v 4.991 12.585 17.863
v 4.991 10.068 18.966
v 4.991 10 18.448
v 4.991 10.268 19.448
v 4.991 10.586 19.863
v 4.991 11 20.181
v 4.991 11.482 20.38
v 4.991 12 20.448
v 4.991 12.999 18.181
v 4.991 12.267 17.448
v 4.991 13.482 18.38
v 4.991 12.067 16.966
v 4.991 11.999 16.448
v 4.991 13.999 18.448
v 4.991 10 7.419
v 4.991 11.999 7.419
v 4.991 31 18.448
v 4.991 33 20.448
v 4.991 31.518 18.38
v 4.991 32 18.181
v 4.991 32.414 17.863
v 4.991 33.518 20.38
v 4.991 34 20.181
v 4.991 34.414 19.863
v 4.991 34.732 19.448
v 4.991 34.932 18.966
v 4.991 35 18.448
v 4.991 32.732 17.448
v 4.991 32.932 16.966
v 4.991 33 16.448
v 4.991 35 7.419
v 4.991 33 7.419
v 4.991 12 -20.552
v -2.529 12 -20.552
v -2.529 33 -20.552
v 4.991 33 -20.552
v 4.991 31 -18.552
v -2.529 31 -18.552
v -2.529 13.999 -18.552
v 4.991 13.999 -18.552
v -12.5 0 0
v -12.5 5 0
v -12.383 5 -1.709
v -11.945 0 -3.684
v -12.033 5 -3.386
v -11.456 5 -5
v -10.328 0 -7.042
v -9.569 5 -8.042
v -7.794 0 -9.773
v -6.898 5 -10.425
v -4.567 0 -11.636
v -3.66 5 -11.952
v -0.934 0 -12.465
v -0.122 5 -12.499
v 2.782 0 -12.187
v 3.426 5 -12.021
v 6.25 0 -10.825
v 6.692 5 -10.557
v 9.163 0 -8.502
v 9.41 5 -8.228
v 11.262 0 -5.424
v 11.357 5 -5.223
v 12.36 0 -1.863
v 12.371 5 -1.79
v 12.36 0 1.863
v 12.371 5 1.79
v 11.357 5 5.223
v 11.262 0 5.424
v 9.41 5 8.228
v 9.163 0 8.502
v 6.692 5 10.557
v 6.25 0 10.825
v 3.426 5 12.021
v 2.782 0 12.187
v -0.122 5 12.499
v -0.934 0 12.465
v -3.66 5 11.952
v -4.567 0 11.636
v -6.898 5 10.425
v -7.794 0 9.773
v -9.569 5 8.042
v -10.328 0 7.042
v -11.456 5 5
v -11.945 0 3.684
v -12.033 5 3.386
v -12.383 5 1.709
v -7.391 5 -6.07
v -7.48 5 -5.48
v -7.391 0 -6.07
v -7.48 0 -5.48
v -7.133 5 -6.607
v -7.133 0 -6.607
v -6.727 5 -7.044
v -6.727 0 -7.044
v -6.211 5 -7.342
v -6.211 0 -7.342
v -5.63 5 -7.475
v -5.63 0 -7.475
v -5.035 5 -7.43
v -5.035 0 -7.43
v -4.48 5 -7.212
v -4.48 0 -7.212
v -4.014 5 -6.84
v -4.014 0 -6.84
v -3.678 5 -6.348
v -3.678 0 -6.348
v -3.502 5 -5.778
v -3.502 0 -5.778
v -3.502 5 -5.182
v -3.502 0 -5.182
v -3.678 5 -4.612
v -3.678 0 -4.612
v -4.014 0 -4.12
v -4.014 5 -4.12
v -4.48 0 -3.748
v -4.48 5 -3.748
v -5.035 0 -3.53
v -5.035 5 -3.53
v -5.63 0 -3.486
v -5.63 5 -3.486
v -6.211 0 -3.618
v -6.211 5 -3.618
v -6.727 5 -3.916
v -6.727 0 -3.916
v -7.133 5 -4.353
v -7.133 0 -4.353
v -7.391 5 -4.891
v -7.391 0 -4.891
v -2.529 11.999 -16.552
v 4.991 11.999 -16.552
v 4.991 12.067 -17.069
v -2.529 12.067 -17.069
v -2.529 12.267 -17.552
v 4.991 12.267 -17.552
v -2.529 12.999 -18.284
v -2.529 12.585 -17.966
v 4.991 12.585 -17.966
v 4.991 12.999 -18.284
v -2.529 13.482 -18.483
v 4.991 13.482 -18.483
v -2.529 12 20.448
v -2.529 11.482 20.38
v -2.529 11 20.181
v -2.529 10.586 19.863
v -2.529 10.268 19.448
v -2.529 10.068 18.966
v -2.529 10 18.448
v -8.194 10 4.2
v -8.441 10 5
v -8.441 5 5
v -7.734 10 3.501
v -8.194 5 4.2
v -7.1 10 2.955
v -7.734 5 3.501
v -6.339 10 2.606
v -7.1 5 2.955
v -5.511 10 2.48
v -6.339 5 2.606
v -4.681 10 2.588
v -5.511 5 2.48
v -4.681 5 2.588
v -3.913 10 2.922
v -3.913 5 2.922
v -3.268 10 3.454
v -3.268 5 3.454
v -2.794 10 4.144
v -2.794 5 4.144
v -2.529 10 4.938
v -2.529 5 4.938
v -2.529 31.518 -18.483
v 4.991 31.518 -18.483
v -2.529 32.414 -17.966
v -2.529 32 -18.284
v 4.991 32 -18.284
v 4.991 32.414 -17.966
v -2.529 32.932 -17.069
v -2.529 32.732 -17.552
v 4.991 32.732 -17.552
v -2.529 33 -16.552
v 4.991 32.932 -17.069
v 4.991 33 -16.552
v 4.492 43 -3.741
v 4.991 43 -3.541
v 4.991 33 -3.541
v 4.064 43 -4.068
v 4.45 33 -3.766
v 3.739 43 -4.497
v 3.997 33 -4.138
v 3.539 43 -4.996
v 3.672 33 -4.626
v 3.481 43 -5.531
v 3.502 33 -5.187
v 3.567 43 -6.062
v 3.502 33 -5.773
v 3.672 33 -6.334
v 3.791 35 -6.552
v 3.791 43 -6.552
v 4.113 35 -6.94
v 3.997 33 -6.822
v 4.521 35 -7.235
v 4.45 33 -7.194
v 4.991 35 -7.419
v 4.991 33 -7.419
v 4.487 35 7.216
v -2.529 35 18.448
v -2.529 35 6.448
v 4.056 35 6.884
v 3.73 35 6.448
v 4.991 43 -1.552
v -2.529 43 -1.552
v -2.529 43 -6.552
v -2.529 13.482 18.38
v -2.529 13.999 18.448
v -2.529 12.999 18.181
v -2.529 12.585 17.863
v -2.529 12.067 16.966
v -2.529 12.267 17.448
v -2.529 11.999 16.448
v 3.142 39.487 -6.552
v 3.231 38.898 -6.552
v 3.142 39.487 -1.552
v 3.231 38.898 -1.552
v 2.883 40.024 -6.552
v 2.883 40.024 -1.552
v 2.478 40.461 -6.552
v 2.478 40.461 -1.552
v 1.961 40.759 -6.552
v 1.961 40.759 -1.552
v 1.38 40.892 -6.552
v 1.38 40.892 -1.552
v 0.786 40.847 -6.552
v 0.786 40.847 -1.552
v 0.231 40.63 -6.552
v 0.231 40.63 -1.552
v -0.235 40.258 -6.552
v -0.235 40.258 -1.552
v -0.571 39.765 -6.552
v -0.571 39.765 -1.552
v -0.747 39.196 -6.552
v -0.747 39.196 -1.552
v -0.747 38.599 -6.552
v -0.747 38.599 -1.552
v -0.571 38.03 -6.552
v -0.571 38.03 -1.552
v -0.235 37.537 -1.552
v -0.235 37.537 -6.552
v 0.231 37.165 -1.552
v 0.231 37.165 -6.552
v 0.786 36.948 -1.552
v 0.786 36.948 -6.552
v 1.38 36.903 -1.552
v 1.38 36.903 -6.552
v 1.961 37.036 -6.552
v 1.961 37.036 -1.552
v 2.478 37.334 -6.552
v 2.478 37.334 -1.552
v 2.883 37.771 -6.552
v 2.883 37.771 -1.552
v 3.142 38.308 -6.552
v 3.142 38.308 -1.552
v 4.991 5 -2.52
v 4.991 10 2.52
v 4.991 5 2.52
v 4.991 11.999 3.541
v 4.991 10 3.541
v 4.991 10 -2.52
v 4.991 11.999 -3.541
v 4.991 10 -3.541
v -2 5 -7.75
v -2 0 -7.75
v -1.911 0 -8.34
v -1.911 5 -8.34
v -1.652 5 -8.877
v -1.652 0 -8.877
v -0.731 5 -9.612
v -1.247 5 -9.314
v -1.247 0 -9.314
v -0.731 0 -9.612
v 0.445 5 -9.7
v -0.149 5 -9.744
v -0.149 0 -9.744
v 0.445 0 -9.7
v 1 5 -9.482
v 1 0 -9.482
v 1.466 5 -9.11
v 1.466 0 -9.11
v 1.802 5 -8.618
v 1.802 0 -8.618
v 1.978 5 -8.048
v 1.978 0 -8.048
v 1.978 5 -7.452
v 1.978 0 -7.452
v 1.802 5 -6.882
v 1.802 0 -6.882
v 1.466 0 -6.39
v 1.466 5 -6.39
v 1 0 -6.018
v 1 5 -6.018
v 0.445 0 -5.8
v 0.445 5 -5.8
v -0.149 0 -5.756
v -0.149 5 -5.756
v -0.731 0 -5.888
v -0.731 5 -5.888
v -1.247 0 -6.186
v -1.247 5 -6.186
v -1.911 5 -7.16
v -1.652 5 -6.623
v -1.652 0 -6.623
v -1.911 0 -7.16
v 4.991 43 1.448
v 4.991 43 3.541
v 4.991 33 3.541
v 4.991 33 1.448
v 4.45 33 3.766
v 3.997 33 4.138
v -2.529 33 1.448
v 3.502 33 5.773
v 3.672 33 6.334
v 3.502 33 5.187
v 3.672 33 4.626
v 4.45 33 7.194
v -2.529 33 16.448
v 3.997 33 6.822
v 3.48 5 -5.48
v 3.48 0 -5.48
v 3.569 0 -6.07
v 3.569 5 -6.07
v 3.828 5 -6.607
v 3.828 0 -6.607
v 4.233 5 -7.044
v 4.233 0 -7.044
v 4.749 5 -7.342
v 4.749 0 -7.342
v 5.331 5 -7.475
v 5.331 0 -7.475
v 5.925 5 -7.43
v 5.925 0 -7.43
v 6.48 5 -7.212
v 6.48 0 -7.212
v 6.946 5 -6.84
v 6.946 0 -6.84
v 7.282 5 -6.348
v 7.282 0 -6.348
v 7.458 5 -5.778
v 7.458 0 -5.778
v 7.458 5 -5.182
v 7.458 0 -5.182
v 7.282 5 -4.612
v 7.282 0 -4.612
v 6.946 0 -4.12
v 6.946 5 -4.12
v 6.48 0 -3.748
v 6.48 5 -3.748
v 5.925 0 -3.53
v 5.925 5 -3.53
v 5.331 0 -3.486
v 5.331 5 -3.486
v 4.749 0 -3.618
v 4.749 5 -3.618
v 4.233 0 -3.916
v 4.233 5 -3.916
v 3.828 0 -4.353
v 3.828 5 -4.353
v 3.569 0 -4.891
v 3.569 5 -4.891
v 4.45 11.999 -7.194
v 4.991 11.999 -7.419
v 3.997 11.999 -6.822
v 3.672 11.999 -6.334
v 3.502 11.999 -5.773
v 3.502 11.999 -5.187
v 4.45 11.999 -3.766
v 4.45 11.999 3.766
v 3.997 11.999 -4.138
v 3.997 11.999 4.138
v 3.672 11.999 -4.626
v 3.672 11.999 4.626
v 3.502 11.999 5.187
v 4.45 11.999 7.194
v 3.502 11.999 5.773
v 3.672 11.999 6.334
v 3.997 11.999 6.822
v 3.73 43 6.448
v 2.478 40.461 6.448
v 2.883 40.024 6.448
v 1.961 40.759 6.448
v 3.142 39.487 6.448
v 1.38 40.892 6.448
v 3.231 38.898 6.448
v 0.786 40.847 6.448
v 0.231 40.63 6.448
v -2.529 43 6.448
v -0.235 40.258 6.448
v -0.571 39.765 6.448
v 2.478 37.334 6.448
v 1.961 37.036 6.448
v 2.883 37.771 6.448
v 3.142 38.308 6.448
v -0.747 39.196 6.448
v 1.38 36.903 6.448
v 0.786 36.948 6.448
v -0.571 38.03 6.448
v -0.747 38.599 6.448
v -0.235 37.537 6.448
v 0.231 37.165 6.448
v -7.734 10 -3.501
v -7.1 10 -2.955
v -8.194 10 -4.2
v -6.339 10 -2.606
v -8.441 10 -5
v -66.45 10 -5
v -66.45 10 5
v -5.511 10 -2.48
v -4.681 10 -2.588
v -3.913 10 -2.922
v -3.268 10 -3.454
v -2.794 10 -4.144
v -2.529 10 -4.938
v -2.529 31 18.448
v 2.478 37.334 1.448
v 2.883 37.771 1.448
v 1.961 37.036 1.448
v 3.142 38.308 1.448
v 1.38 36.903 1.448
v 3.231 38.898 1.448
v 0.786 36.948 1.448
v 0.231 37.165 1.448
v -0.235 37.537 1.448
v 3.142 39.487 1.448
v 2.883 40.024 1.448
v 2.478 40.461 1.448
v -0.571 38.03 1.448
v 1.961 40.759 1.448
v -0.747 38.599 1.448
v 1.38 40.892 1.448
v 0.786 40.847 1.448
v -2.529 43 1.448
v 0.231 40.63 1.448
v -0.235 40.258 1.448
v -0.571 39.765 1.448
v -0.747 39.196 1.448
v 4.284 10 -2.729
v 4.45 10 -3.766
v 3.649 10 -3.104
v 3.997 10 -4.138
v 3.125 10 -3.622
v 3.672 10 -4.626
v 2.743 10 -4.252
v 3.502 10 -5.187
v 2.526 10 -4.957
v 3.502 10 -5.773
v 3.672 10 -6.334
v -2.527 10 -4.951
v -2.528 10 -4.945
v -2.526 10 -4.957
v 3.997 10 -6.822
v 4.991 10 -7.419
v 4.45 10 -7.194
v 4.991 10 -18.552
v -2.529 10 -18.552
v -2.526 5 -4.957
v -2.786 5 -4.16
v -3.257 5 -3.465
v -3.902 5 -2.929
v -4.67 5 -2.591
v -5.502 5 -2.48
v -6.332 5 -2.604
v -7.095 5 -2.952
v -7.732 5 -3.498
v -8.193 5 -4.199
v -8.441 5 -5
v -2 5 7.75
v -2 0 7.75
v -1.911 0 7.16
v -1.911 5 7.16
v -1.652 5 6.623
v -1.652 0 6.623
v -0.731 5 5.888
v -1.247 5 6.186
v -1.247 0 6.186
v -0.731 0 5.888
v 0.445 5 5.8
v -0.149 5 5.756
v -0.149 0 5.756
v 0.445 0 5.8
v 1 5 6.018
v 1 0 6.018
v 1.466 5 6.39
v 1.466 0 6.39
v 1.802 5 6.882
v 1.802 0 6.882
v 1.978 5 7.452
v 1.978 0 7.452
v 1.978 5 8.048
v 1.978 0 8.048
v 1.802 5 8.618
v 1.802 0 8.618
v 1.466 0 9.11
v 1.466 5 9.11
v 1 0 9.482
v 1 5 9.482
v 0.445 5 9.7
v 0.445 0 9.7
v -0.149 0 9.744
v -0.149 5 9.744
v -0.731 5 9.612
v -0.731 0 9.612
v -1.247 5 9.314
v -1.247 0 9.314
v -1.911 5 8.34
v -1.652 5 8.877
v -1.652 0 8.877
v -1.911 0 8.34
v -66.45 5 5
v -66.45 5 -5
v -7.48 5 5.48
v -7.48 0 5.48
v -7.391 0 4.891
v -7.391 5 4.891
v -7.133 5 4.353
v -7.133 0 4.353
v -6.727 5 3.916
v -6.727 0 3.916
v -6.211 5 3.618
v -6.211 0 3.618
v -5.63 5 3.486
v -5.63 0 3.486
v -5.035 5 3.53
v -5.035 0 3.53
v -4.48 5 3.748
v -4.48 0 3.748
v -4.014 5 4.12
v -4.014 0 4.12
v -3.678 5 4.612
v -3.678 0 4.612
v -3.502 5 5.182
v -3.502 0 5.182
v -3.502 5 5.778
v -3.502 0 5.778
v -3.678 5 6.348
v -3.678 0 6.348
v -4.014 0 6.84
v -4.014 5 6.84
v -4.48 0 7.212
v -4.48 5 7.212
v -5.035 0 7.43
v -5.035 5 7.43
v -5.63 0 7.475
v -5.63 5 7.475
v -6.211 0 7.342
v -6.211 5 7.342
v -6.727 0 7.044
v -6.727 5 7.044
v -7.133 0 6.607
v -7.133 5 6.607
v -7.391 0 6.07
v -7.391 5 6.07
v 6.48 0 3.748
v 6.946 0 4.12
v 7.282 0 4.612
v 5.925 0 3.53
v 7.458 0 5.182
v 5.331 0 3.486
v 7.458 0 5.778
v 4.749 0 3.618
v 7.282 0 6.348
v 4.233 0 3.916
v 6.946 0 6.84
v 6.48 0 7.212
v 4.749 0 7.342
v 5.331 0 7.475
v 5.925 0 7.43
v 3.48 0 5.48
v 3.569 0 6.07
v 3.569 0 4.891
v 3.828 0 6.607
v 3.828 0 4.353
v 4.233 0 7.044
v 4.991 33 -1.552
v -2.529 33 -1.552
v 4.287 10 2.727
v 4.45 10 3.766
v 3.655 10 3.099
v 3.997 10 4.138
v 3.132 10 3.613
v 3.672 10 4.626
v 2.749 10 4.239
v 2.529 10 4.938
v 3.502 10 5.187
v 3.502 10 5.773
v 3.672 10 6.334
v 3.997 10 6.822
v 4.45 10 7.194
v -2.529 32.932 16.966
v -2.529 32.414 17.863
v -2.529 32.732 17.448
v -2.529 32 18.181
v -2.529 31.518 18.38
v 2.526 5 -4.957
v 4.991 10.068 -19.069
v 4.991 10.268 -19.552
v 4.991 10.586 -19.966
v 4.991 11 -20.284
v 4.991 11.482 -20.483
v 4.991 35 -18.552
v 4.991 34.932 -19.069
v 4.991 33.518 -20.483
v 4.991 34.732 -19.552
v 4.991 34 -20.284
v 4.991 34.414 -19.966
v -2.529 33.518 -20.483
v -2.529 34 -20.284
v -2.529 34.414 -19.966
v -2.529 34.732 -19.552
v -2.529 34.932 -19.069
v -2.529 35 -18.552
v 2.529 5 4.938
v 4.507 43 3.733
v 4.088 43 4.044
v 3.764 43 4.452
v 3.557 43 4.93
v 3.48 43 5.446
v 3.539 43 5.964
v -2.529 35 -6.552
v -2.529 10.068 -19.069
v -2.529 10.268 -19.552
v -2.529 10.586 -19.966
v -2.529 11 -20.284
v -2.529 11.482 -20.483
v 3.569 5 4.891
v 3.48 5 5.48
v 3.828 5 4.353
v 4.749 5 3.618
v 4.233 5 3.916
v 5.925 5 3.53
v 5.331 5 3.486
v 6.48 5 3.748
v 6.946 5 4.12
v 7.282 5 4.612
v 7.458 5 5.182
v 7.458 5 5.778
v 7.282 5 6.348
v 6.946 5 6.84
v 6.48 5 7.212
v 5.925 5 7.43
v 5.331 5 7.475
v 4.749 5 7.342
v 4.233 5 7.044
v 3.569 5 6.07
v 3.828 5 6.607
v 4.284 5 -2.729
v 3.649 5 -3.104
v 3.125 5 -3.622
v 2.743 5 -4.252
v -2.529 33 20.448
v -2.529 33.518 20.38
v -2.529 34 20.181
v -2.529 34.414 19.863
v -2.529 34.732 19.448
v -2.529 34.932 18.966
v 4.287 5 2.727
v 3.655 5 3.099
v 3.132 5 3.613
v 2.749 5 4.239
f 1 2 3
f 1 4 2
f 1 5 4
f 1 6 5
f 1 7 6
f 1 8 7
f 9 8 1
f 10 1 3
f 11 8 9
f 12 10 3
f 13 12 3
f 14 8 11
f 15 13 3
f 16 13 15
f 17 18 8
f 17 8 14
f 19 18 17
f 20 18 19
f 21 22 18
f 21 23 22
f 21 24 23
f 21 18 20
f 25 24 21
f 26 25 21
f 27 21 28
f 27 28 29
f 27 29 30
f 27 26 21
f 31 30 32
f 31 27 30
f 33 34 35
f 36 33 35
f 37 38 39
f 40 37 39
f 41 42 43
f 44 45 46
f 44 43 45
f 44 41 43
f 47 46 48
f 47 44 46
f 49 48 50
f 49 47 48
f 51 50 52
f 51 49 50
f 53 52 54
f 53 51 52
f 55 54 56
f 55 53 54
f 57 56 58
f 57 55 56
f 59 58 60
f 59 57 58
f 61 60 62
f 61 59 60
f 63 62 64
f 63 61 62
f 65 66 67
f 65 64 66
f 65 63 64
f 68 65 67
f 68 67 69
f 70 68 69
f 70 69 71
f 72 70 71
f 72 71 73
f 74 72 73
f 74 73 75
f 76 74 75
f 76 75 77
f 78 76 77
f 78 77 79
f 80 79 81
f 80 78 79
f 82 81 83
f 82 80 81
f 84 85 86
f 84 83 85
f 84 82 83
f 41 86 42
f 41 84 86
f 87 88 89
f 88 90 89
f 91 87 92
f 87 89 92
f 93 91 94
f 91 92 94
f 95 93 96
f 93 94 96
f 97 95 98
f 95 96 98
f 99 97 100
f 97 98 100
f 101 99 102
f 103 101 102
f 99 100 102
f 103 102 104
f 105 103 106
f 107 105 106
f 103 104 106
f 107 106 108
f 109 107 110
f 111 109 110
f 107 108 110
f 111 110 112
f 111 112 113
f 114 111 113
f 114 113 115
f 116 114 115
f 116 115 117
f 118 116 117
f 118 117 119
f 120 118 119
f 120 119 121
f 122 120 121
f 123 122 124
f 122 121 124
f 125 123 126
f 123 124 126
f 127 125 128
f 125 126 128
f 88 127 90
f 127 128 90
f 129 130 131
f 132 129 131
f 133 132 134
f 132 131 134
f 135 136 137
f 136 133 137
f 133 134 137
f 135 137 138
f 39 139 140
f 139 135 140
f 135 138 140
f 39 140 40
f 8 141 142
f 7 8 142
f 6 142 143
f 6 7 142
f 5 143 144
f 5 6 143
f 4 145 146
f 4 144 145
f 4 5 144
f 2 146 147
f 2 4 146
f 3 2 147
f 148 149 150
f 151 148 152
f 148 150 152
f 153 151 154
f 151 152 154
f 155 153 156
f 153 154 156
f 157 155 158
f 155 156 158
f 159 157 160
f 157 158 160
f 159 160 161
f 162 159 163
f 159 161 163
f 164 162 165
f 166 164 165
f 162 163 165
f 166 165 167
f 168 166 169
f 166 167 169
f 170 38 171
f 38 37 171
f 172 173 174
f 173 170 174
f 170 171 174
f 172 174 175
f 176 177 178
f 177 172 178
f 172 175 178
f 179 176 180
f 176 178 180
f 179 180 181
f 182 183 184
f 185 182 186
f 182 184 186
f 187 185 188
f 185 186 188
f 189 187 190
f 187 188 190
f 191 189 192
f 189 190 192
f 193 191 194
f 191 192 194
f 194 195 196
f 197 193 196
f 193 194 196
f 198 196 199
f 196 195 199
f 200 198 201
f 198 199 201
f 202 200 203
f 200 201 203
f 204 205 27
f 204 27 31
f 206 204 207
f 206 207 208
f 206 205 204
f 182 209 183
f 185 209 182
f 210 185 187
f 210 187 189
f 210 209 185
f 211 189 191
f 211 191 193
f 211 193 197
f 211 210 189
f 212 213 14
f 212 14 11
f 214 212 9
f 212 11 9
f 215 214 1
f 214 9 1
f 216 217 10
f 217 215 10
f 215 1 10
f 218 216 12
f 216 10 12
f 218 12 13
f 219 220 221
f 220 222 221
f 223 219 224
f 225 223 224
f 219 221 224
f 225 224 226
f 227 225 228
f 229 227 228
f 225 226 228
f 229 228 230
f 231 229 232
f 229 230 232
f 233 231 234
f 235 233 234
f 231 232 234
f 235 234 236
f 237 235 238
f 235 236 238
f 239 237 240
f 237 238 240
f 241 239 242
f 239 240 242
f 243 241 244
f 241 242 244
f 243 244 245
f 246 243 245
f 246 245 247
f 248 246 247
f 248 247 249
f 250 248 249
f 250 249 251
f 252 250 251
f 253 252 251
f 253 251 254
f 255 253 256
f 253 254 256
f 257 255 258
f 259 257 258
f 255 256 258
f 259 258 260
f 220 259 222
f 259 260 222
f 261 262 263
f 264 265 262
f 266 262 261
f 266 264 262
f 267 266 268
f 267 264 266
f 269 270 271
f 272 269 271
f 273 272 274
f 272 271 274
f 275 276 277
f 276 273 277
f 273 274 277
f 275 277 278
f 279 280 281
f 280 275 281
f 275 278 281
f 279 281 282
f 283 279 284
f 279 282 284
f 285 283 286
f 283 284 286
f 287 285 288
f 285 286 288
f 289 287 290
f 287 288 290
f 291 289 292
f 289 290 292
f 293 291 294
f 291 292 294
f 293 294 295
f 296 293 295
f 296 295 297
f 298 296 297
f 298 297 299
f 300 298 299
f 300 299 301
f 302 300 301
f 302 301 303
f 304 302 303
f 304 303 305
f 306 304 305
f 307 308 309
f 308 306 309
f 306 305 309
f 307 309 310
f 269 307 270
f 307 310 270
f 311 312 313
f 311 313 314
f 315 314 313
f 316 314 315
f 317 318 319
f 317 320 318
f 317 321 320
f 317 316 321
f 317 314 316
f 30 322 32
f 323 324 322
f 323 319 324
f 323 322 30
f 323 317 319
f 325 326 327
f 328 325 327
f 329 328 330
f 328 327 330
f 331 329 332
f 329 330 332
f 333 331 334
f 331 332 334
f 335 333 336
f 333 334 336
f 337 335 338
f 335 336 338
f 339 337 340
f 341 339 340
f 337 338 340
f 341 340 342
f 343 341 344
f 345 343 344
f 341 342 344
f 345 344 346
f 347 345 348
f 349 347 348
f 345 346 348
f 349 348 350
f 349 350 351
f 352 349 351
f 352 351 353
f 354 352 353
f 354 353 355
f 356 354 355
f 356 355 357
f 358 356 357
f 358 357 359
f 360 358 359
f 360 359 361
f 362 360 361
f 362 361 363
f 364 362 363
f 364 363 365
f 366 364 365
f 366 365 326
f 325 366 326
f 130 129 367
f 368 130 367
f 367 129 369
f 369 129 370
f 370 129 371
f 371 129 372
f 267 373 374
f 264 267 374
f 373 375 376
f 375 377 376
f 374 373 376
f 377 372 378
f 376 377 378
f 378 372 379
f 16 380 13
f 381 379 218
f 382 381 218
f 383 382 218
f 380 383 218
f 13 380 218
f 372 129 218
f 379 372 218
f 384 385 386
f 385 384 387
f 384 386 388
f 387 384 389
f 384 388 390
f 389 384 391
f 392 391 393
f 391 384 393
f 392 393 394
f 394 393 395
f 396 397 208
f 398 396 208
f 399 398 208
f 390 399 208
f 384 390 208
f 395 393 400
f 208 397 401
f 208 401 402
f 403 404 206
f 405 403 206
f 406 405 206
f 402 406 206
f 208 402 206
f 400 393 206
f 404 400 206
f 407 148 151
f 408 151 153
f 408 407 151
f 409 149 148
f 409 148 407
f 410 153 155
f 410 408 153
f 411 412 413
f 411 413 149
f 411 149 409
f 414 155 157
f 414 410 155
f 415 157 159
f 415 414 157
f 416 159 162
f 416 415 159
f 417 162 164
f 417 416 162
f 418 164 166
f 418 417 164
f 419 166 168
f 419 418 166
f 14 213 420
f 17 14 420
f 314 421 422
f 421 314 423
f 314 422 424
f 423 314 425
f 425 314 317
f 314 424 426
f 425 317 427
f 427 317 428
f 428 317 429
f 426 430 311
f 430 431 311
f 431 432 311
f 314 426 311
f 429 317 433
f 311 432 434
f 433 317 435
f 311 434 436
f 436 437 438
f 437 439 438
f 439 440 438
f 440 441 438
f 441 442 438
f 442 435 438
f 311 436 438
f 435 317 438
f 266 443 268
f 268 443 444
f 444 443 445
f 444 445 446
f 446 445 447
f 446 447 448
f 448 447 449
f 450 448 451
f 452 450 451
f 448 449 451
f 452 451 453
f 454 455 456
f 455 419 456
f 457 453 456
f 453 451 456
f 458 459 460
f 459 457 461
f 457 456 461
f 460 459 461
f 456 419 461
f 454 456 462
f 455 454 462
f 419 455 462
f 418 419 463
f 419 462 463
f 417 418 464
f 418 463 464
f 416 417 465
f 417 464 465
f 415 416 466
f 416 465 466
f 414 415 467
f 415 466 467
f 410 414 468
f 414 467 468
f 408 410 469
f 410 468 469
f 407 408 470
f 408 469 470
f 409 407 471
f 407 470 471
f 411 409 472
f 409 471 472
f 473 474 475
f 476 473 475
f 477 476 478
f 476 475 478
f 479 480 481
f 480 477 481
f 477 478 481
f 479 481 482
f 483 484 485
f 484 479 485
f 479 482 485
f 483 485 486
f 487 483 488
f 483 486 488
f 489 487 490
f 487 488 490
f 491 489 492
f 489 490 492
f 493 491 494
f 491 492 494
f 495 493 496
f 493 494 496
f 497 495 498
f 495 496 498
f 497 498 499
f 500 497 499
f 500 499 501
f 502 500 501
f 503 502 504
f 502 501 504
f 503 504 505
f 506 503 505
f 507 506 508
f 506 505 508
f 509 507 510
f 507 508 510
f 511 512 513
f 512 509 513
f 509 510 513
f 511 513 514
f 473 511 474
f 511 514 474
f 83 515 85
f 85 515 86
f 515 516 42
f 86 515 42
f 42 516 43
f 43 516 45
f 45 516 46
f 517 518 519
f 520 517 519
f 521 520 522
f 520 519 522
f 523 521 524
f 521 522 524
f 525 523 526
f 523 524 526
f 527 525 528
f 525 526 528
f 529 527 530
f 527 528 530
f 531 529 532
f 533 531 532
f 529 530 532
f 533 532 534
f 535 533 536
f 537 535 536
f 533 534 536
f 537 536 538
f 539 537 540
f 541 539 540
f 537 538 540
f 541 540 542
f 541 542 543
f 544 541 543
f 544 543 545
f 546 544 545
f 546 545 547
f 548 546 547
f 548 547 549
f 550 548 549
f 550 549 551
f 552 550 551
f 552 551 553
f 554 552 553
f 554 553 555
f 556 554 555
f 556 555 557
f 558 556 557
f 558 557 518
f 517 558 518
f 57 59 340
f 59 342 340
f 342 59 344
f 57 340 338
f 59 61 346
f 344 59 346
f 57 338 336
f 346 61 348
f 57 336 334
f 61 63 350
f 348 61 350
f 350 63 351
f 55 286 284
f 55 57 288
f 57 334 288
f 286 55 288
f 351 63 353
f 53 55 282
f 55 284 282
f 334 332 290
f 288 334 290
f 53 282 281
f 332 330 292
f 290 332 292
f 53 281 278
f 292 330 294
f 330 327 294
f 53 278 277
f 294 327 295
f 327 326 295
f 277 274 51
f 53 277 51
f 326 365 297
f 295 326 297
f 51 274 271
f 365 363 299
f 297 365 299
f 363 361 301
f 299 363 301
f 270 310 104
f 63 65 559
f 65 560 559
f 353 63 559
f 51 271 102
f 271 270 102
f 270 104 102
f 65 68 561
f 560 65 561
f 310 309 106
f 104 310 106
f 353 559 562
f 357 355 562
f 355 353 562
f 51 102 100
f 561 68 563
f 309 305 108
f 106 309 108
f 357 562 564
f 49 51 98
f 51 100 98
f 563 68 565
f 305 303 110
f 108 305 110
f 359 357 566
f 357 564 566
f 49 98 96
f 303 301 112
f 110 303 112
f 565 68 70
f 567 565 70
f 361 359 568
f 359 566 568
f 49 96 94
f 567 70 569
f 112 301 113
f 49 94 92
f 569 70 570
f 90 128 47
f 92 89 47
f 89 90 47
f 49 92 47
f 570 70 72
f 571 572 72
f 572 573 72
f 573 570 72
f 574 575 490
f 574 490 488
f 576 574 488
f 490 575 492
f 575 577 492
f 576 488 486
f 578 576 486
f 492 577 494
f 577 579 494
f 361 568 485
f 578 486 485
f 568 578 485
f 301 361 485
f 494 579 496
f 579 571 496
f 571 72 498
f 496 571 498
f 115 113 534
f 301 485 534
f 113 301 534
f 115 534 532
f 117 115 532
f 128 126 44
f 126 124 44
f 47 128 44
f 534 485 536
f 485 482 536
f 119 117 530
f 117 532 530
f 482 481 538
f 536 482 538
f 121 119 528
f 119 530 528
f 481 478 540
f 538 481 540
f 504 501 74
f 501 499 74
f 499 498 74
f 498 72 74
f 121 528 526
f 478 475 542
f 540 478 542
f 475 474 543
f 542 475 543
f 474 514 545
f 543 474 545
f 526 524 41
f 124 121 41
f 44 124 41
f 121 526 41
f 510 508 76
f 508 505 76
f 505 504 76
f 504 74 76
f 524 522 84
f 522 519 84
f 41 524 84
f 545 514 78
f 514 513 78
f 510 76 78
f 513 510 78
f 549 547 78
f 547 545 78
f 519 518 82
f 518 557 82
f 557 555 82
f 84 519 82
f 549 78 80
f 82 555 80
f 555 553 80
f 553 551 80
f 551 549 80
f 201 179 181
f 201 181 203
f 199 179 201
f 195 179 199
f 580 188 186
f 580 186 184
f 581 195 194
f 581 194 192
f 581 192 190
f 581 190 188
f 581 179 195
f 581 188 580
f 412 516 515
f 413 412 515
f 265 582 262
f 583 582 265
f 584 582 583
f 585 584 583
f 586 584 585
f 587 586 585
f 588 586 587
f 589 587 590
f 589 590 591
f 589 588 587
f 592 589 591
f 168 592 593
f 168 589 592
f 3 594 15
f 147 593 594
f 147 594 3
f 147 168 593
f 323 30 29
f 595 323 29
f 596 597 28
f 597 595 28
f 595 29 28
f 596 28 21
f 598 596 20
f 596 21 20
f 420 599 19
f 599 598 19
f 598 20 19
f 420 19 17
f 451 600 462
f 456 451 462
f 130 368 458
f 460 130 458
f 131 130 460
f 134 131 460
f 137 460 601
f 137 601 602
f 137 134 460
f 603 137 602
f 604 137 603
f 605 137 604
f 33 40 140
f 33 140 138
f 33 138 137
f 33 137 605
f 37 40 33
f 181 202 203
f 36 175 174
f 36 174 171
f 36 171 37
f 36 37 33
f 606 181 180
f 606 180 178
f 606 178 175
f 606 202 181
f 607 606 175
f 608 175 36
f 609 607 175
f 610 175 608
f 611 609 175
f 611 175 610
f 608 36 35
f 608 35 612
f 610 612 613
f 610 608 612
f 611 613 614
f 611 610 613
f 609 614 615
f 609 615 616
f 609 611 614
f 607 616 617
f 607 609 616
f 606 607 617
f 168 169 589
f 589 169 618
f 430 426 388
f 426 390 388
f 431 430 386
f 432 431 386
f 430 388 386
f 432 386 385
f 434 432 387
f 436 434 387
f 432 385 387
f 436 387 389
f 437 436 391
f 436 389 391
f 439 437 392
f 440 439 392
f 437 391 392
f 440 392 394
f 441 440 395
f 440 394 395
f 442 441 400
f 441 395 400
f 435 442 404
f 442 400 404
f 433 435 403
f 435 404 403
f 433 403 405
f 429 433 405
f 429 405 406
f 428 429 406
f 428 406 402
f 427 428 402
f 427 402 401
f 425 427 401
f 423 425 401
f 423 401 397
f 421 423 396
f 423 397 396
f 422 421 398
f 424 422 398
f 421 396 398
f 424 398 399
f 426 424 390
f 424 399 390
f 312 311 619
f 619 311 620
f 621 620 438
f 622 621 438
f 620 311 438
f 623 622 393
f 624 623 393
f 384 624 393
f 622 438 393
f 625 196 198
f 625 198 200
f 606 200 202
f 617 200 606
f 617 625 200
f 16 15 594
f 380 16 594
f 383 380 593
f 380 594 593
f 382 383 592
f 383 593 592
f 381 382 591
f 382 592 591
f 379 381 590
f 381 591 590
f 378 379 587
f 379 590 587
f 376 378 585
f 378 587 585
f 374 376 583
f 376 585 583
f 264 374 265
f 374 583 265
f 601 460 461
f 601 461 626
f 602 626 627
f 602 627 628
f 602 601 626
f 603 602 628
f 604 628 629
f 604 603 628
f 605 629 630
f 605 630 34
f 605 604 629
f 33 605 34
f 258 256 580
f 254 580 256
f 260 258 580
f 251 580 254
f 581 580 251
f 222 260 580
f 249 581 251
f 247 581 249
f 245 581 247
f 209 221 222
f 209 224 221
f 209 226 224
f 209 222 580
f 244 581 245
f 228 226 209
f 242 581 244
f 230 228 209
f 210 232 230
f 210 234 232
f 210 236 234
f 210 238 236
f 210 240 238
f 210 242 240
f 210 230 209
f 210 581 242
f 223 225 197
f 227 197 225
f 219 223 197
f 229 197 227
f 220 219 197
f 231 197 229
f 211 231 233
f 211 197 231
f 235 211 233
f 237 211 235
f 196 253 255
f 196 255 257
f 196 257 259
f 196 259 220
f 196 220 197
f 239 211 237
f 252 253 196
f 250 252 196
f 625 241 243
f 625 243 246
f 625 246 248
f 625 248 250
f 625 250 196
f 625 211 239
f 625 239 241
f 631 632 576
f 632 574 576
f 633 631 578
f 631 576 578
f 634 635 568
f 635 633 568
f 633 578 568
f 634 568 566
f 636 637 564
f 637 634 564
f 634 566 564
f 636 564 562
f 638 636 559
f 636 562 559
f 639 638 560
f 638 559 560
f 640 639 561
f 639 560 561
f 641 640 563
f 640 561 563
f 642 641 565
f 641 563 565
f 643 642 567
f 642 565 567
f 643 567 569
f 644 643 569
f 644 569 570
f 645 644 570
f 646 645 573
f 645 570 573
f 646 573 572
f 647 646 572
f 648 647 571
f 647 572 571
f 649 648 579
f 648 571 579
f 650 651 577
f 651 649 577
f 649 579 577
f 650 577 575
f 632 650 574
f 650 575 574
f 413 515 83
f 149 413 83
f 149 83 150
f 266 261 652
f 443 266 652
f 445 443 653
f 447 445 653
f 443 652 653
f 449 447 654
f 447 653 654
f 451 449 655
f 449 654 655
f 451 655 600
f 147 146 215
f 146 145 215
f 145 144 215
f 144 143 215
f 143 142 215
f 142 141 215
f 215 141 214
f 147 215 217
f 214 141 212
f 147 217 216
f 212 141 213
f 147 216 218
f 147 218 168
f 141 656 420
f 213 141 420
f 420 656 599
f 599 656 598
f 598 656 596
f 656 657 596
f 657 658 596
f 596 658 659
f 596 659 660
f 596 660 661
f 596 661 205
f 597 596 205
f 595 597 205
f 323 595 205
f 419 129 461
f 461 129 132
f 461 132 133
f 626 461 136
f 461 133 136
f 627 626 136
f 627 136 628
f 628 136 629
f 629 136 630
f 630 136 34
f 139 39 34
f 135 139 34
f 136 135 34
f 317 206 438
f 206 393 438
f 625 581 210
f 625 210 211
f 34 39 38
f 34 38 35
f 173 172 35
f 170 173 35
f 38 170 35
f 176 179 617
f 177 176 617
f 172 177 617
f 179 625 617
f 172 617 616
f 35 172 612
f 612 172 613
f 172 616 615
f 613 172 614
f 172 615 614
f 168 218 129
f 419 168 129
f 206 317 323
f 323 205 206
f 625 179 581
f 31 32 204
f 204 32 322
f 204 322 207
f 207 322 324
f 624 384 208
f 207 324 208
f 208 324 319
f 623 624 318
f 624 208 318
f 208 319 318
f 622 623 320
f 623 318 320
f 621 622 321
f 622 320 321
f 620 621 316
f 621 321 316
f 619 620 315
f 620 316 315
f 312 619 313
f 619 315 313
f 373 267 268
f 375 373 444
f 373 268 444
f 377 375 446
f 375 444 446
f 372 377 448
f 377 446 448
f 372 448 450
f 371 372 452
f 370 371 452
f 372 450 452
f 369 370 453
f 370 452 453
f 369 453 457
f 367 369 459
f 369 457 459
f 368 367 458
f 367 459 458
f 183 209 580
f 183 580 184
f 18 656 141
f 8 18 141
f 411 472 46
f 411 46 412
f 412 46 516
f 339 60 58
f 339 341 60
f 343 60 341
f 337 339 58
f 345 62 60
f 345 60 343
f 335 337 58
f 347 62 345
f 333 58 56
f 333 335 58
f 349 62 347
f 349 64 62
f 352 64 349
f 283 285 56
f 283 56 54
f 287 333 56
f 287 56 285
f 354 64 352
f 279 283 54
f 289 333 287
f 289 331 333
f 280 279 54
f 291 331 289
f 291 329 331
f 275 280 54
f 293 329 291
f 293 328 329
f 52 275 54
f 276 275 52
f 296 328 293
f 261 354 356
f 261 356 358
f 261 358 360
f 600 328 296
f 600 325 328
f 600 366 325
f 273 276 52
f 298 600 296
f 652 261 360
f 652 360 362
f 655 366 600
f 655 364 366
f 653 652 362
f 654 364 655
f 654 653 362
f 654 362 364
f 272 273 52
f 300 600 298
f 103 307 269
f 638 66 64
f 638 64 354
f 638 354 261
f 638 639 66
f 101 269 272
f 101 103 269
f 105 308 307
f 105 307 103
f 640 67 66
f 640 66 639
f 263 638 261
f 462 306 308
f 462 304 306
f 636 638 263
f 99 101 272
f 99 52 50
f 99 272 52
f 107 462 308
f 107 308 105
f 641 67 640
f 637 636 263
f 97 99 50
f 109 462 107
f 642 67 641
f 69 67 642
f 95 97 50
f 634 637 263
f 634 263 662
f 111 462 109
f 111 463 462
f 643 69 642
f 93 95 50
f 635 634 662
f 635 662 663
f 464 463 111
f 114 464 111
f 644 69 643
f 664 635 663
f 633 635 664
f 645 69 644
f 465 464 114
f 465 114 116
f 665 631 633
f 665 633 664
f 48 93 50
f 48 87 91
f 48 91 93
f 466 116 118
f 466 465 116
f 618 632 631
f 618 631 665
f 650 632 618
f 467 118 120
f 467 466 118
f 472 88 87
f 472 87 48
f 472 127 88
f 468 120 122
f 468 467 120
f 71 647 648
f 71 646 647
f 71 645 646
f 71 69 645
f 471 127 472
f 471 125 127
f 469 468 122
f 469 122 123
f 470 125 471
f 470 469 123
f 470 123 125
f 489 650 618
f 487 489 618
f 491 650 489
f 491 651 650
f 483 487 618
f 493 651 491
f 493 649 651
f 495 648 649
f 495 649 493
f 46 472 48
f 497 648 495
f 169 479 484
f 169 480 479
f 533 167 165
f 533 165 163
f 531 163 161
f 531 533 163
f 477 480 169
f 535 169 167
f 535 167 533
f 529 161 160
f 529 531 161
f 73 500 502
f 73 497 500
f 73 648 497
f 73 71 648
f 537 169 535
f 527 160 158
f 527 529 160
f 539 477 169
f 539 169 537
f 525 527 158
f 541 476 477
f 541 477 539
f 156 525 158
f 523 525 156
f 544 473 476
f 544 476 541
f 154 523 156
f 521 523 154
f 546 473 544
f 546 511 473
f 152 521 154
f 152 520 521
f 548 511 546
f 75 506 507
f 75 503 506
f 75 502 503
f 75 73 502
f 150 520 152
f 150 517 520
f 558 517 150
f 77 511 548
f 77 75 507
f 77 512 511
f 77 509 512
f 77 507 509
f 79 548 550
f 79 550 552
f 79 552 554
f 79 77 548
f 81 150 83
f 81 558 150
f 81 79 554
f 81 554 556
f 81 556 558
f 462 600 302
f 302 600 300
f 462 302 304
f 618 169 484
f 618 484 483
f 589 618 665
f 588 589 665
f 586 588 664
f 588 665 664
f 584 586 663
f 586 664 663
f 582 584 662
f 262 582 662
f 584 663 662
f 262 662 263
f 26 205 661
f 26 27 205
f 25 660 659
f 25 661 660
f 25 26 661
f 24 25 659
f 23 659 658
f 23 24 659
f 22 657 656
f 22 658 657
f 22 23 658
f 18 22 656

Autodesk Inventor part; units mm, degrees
ref_plane "YZ Plane" through (0, 0, 0) normal (1, 0, 0) x (0, 1, 0)
ref_plane "XZ Plane" through (0, 0, 0) normal (0, 1, 0) x (-1, 0, 0)
ref_plane "XY Plane" through (0, 0, 0) normal (0, 0, 1) x (1, 0, 0)
sketch "Sketch1" plane through (0, 0, 0) normal (0, 1, 0) x (-1, 0, 0)
  circle A0 centre (0, 0) radius 12.5
  line L0 (0, 0) -> (7.75, 0) construction
  circle A1 centre (5.4801, -5.4801) radius 2
  circle A2 centre (-5.4801, -5.4801) radius 2
  circle A3 centre (-5.4801, 5.4801) radius 2
  circle A4 centre (5.4801, 5.4801) radius 2
  circle A5 centre (0, -7.75) radius 2
  circle A6 centre (0, 7.75) radius 2
  dimension "d0" = 25
  dimension "d3" = 4
  dimension "d6" = 360
  dimension "d8" = 4
  dimension "d11" = 360
extrude "Extrusion1" add sketch "Sketch1" along normal blind 5
sketch "Sketch2" plane through (0, 5, 0) normal (0, 1, 0) x (1, 0, 0)
  line L0 (4.991, -3.5408) -> (4.991, 3.5408)
  line L1 (-66.4503, 5) -> (-66.4503, -5)
  line L2 (4.991, -4.9385) -> (14.991, -4.9385) construction
  line L3 (-82.7386, 0) -> (31.2793, 0) projected
  arc A0 (-3.5548, -4.9385) -> (-7.4216, -5) centre (-5.4801, -5.4801) ccw
  line L4 (-66.4503, -5) -> (-7.4216, -5)
  line L5 (-3.5548, -4.9385) -> (3.5548, -4.9385)
  circle A1 centre (-5.4801, 5.4801) radius 2 projected
  arc A2 (-7.4216, 5) -> (-3.5497, 4.9571) centre (-5.4801, 5.4801) ccw
  line L6 (3.5497, 4.9571) -> (-3.5497, 4.9571)
  line L7 (-7.4216, 5) -> (-66.4503, 5)
  arc A3 (4.991, -3.5408) -> (3.5548, -4.9385) centre (5.4801, -5.4801) ccw
  circle A4 centre (5.4801, 5.4801) radius 2 projected
  arc A5 (3.5497, 4.9571) -> (4.991, 3.5408) centre (5.4801, 5.4801) ccw
  dimension "d24" = 10
  dimension "d25" = 90
  dimension "d26" = 70
  dimension "d27" = 4
  dimension "d28" = 4
  dimension "d29" = 4
  dimension "d30" = 4
extrude "Extrusion2" add sketch "Sketch2" along normal blind 5 contours A3 L5 A0 L4 L1 L3 L0 | L3 L1 L7 A1 L6 A4 L0
sketch "Sketch4" plane through (0, 10, 0) normal (0, 1, 0) x (1, 0, 0)
  line L0 (-3.5548, -4.9385) -> (3.5548, -4.9385) projected
  line L1 (-3.5548, -4.9385) -> (3.5548, -4.9385)
  line L2 (3.5497, 4.9571) -> (-3.5497, 4.9571) projected
  line L3 (-3.5497, 4.9571) -> (3.5497, 4.9571)
  line L4 (-4.4956, -10.2074) -> (2.6201, -10.2074)
  point P0 (0, 0)
sketch "Sketch8" plane through (0, 5, 0) normal (0, 1, 0) x (1, 0, 0)
  circle A0 centre (-5.4801, 5.4801) radius 2 projected
  circle A1 centre (-5.4801, 5.4801) radius 3
  circle A2 centre (-5.4801, -5.4801) radius 2 projected
  circle A3 centre (-5.4801, -5.4801) radius 3
  circle A4 centre (5.4801, 5.4801) radius 2 projected
  circle A5 centre (5.4801, 5.4801) radius 3
  arc A6 (3.5548, -4.9385) -> (4.991, -3.5408) centre (5.4801, -5.4801) ccw projected
  circle A7 centre (5.4801, -5.4801) radius 3
  point P0 (0, 0)
  dimension "d50" = 6
  dimension "d51" = 6
  dimension "d52" = 6
  dimension "d53" = 6
extrude "Extrusion6" cut sketch "Sketch8" along normal blind 39.25 contours A0 | A1 | A2 | A3 | A4 | A5 | A7
sketch "Sketch30" plane through (0, 10, 0) normal (0, 1, 0) x (1, 0, 0)
  line L0 (-2.5294, -4.9385) -> (2.5294, -4.9385) projected
  arc A0 (-8.4414, 5) -> (-2.526, 4.9571) centre (-5.4801, 5.4801) ccw projected
  line L1 (-2.5294, -18.4485) -> (-2.5294, 18.5515)
  arc A1 (4.991, -2.5202) -> (2.5294, -4.9385) centre (5.4801, -5.4801) ccw projected
  arc A2 (2.526, 4.9571) -> (4.991, 2.5202) centre (5.4801, 5.4801) ccw projected
  point P0 (0, 0)
  dimension "d90" = 13.51
  dimension "d91" = 37
sketch "Sketch31" plane through (4.991, 5, 2.5202) normal (1, 0, 0) x (0, 0, -1)
  point P0 (2.5202, -5)
ref_plane "Work Plane4" through (-2.5294, 10, 18.4485) normal (1, 0, 0) x (0, 0, -1)
sketch "Sketch41" plane through (-2.5294, 10, 18.4485) normal (1, 0, 0) x (0, 0, -1)
  line L0 (0, 0) -> (-2, 0)
  line L1 (-2, 0) -> (39, 0)
  line L2 (15.9283, 0) -> (20.9687, 0) projected
  line L3 (39, 0) -> (39, 25)
  line L4 (-2, 25) -> (-2, 0)
  line L5 (18.5, 1.9993) -> (0, 1.9993)
  line L6 (18.5, 1.9993) -> (37, 1.9993)
  line L7 (0, 1.9993) -> (37, 1.9993)
  line L8 (37, 23) -> (37, 1.9993)
  line L9 (0, 12.5) -> (0, 23)
  line L10 (0, 23) -> (0, 1.9993)
  line L11 (17, 23) -> (17, 33)
  line L12 (17, 33) -> (12, 33)
  line L13 (12, 33) -> (12, 25)
  line L14 (20, 23) -> (20, 33)
  line L15 (20, 33) -> (25, 33)
  line L16 (25, 33) -> (25, 25)
  line L17 (25, 25) -> (39, 25)
  line L18 (39, 25) -> (39, 0)
  line L19 (39, 0) -> (-2, 0)
  line L20 (30.9485, -10) -> (5.9485, -10) projected
  line L21 (-2, 0) -> (-2, 25)
  line L22 (-2, 25) -> (12, 25)
  line L23 (12, 33) -> (17, 33)
  line L24 (17, 33) -> (17, 23)
  line L25 (17, 23) -> (0, 23)
  line L26 (0, 23) -> (0, 1.9993)
  line L27 (37, 1.9993) -> (0, 1.9993)
  line L28 (30.9485, -5) -> (5.9485, -5) projected
  line L29 (37, 1.9993) -> (37, 23)
  line L30 (37, 23) -> (20, 23)
  line L31 (20, 23) -> (20, 33)
  line L32 (25, 33) -> (25, 25)
  point P0 (18.4485, -10)
  point P1 (13.4485, -5)
  point P2 (23.4485, -5)
  point P3 (0, 12.5)
  dimension "d129" = 2
  dimension "d130" = 41
  dimension "d131" = 25
  dimension "d132" = 41
  dimension "d138" = 3
  dimension "d139" = 10
  dimension "d140" = 5
  dimension "d141" = 5
extrude "Extrusion14" add sketch "Sketch41" along normal up to surface (7.5204 mm away)
sketch "Sketch42" plane through (-2.5294, 35, 6.4485) normal (0, 0, 1) x (1, 0, 0)
  line L0 (0, 0) -> (0, 8) projected
  line L1 (7.5204, -2) -> (7.5204, 8) projected
  line L2 (0, 8) -> (7.5204, 8) projected
  circle A0 centre (3.7602, 3.8975) radius 2
  point P0 (2.5294, -35)
  dimension "d144" = 4
extrude "Extrusion15" cut sketch "Sketch42" against normal through all
fillet "Fillet3" radius 2 8 edges at (1.2308, 11.9993, 18.4485) (1.2308, 10, 20.4485) (1.2308, 10, -20.5515) (1.2308, 35, -20.5515) (1.2308, 33, -18.5515) (1.2308, 11.9993, -18.5515) (1.2308, 33, 18.4485) (1.2308, 35, 20.4485)
extrude "Extrusion17" cut sketch "Sketch1" along normal through all contours A2 | A3
properties part number "Marker holder"
